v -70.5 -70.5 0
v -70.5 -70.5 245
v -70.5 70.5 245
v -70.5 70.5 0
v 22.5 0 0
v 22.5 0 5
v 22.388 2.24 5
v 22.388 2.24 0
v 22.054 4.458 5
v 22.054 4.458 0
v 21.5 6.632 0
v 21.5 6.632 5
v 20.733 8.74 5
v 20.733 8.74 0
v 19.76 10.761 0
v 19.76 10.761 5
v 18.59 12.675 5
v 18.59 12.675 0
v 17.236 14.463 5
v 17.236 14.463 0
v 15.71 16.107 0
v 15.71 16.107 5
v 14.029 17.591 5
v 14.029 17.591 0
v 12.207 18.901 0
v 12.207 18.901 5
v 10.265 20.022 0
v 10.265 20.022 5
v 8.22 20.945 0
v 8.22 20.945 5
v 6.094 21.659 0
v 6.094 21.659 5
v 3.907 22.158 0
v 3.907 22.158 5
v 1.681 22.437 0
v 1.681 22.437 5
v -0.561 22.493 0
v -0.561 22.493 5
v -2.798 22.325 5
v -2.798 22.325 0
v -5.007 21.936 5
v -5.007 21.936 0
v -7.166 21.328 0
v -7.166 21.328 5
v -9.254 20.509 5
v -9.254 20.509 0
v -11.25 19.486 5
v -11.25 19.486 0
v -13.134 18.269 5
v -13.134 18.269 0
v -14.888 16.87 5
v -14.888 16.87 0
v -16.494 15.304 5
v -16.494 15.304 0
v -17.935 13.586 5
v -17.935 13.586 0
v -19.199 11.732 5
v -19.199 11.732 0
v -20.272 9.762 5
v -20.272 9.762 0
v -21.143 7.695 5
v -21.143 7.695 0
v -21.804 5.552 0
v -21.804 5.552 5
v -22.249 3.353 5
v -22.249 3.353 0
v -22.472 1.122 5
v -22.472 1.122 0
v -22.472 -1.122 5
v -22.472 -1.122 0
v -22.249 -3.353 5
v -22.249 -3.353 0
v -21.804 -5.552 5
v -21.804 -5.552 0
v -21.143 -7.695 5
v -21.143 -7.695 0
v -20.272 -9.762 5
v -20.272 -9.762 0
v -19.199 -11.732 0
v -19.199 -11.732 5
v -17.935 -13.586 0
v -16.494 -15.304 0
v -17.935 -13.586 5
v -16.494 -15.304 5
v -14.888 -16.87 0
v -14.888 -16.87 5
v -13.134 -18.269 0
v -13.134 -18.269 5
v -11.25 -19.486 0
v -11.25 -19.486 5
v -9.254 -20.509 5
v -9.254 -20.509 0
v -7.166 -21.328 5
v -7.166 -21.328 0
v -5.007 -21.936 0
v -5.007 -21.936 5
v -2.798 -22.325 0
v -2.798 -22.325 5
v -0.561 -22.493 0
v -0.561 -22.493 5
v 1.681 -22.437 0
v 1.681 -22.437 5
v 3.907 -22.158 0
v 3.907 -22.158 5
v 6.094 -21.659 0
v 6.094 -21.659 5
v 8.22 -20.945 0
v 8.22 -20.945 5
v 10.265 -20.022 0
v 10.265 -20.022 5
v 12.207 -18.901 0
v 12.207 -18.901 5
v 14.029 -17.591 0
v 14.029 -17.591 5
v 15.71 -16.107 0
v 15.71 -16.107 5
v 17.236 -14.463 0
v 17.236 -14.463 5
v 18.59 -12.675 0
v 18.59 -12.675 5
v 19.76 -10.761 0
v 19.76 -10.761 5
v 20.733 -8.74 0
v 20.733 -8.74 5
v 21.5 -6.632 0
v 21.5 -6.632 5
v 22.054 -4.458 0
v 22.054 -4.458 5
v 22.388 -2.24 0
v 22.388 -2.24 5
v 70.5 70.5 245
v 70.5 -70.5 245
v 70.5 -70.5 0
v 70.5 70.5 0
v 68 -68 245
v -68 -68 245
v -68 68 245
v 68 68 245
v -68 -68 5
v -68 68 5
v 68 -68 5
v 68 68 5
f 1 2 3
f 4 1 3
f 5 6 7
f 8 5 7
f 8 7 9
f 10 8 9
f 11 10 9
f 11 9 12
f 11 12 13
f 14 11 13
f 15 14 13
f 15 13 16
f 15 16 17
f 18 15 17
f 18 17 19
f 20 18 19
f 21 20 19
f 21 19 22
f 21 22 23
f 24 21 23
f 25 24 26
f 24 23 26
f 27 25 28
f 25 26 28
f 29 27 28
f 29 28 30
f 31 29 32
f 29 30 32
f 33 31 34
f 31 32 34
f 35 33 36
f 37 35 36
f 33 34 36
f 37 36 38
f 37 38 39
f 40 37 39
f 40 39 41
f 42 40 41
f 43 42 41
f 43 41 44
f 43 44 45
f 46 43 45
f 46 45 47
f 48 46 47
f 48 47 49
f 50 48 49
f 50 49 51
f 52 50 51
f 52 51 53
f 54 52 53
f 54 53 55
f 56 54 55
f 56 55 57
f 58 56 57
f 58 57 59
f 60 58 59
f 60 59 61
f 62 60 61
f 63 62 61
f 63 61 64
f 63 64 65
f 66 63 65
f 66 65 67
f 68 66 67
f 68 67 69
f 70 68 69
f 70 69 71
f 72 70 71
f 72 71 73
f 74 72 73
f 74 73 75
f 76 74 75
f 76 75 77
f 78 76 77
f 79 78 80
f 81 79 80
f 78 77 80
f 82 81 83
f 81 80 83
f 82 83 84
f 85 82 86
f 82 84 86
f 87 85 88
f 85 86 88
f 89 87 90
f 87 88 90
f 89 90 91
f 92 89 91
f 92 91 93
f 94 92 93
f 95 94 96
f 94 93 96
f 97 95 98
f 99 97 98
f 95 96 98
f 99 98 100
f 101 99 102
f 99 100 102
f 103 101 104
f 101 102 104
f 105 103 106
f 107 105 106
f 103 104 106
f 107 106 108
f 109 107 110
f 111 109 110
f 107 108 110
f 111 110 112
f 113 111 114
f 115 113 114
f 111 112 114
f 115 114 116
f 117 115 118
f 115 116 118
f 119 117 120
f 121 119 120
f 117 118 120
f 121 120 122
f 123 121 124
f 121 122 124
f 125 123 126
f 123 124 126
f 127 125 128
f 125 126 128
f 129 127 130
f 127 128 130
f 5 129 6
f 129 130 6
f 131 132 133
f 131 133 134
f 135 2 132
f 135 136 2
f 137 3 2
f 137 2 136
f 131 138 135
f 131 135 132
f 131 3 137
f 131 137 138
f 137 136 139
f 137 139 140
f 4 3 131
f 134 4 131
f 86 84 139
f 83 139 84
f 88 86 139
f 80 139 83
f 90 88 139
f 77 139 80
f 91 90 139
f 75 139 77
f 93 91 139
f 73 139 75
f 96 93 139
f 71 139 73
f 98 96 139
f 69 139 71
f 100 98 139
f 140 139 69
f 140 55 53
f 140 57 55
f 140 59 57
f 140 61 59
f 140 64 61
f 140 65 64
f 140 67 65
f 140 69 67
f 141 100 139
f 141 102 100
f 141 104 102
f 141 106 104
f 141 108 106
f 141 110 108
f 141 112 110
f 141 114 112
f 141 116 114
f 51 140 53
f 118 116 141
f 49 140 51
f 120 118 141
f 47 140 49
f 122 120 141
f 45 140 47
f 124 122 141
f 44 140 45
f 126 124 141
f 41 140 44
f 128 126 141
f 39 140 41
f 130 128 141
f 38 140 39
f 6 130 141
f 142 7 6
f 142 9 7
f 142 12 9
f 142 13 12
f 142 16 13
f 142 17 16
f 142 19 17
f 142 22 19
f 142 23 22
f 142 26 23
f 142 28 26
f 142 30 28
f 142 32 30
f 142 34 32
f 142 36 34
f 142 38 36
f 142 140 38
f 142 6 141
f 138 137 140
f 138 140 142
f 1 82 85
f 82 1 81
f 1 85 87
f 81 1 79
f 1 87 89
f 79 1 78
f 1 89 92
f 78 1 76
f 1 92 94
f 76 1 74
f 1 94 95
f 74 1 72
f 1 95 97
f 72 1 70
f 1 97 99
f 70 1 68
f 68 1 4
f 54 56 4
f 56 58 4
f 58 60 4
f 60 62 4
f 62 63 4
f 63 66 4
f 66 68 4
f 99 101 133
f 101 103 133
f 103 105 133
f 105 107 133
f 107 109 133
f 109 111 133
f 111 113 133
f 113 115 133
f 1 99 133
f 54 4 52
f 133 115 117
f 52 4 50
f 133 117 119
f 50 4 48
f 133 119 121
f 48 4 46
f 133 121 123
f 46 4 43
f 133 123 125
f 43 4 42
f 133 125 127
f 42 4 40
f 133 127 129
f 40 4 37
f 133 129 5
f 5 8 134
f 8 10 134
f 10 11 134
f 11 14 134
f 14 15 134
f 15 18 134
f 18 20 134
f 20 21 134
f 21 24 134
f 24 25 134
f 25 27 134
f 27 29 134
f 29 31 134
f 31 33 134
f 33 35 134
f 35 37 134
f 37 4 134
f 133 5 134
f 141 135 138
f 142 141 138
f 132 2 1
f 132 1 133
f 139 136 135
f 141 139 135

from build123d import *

# Parameters (mm, degrees)
F0_W     = 141
F0_H     = 141
F0_W_2   = 136
F0_H_2   = 136
F1_DEPTH = 5
F2_DEPTH = 245
F3_R     = 22.5
F4_DEPTH = 25


with BuildPart() as f1:
    # F0 (on Top) → F1 (new body)
    with BuildSketch(Plane.XY):
        Rectangle(F0_W, F0_H)
        Rectangle(F0_W_2, F0_H_2, mode=Mode.SUBTRACT)
        Rectangle(F0_W_2, F0_H_2)
    extrude(amount=F1_DEPTH)

    # F0 (on Top) → F2 (join)
    with BuildSketch(Plane.XY):
        Rectangle(F0_W, F0_H)
        Rectangle(F0_W_2, F0_H_2, mode=Mode.SUBTRACT)
    extrude(amount=F2_DEPTH)

    # F3 (on face) → F4 (cut)
    with BuildSketch(Plane.XY.offset(5)):
        Circle(F3_R)
    extrude(amount=-F4_DEPTH, mode=Mode.SUBTRACT)


solid = f1.part
